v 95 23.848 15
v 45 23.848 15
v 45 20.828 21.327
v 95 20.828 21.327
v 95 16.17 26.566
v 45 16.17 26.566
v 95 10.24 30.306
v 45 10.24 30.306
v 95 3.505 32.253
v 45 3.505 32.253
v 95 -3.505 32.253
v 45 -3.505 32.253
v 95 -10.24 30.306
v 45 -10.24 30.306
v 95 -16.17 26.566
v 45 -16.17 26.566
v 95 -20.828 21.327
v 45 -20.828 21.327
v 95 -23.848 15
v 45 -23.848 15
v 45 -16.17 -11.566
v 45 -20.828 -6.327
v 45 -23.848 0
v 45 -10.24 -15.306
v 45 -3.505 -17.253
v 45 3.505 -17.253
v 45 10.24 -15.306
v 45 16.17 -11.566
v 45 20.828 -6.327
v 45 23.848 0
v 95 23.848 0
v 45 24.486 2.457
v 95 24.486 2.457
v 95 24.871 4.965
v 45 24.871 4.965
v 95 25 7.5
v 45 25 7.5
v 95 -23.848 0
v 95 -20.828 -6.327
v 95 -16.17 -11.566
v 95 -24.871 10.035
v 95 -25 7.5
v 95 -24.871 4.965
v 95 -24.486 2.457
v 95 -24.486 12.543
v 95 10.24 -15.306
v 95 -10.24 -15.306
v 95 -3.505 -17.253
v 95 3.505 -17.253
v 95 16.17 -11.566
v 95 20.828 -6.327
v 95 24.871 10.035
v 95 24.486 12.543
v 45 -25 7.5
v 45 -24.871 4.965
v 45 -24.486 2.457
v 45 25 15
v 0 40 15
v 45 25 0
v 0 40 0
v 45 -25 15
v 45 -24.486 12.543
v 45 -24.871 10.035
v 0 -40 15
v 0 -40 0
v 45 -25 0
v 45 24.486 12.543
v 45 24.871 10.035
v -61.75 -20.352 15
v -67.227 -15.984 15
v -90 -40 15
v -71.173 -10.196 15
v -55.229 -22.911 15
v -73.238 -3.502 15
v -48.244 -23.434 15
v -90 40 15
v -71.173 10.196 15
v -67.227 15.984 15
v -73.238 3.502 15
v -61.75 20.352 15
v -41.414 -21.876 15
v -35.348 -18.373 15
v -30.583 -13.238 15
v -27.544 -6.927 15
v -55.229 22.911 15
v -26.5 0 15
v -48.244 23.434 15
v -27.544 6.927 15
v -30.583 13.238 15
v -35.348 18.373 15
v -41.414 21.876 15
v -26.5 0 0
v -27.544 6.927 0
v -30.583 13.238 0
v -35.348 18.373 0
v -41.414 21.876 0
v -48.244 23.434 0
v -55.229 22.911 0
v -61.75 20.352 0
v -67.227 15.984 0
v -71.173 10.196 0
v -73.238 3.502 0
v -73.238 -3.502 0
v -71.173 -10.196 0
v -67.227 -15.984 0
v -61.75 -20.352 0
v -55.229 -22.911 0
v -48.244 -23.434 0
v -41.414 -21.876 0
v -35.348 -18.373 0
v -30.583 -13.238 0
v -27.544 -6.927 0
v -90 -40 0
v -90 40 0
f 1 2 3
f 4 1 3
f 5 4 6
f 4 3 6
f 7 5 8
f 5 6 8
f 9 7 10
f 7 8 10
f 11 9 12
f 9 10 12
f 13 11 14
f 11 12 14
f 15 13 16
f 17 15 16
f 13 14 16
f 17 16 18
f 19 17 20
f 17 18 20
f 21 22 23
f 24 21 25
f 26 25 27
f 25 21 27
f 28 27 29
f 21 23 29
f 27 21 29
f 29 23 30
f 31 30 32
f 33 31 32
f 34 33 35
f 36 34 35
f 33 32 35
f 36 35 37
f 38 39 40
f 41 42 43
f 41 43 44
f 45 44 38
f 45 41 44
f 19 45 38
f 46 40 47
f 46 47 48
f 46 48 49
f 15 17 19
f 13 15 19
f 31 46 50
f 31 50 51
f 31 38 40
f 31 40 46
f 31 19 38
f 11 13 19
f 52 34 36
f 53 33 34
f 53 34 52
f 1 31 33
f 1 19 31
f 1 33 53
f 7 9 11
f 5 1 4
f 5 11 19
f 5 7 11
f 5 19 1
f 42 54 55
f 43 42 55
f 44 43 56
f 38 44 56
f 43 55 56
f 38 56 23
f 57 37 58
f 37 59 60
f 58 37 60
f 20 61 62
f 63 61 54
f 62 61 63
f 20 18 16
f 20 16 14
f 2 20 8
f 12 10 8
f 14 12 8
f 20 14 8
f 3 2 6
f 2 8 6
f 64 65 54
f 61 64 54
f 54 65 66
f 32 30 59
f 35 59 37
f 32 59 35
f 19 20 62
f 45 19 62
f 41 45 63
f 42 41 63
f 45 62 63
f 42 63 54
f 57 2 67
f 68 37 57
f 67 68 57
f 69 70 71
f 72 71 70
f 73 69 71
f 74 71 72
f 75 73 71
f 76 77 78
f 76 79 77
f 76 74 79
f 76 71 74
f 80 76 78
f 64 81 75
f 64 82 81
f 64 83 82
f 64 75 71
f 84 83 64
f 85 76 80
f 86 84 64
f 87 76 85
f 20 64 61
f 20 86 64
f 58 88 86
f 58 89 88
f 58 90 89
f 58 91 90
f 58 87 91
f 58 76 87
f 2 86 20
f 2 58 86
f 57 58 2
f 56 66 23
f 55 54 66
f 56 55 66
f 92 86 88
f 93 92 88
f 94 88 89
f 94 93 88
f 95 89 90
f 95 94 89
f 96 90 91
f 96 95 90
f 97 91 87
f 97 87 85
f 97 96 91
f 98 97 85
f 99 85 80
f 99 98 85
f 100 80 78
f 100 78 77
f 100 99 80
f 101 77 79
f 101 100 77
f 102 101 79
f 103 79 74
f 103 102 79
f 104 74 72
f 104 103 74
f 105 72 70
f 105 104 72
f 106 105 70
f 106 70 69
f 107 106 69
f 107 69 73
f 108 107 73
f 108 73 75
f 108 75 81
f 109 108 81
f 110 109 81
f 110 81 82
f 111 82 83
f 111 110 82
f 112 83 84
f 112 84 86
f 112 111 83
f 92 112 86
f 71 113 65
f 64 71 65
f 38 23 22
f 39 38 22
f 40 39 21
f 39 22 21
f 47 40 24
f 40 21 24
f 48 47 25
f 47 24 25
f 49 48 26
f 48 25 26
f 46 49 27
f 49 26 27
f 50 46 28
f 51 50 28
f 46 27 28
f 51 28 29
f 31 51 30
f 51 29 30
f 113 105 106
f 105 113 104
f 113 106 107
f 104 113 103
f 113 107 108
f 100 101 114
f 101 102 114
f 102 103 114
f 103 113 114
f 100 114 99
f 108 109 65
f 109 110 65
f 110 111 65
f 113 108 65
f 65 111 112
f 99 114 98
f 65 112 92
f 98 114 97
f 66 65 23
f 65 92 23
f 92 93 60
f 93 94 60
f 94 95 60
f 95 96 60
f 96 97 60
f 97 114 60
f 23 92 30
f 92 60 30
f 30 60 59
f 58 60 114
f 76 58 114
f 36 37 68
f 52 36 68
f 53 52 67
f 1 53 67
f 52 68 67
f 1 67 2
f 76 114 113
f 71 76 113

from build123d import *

# Parameters (mm, degrees)
F0_R     = 23.5
F1_DEPTH = 15
F3_DEPTH = 50


with BuildPart() as f1:
    # F0 (on Top) → F1 (new body)
    with BuildSketch(Plane.XY):
        Polygon((-90, -40), (0, -40), (45, -25), (45, 25), (0, 40), (-90, 40), align=None)
        with Locations((-50, 0)):
            Circle(F0_R, mode=Mode.SUBTRACT)
    extrude(amount=F1_DEPTH)

    # F2 (on face) → F3 (join)
    with BuildSketch(Plane.YZ.offset(45)):
        with BuildLine():
            ThreePointArc((23.8484800354, 0), (24.7104431454, 3.7060575179), (25, 7.5))
            ThreePointArc((25, 7.5), (24.7104431454, 11.2939424821), (23.8484800354, 15))
            Line((23.8484800354, 15), (-23.8484800354, 15))
            ThreePointArc((-23.8484800354, 15), (-24.7104431454, 11.2939424821), (-25, 7.5))
            ThreePointArc((-25, 7.5), (-24.7104431454, 3.7060575179), (-23.8484800354, 0))
            Line((-23.8484800354, 0), (23.8484800354, 0))
        make_face()
        with BuildLine():
            Line((-23.8484800354, 15), (23.8484800354, 15))
            ThreePointArc((23.8484800354, 15), (0, 32.5), (-23.8484800354, 15))
        make_face()
        with BuildLine():
            ThreePointArc((-23.8484800354, 0), (0, -17.5), (23.8484800354, 0))
            Line((23.8484800354, 0), (-23.8484800354, 0))
        make_face()
    extrude(amount=F3_DEPTH)


solid = f1.part
